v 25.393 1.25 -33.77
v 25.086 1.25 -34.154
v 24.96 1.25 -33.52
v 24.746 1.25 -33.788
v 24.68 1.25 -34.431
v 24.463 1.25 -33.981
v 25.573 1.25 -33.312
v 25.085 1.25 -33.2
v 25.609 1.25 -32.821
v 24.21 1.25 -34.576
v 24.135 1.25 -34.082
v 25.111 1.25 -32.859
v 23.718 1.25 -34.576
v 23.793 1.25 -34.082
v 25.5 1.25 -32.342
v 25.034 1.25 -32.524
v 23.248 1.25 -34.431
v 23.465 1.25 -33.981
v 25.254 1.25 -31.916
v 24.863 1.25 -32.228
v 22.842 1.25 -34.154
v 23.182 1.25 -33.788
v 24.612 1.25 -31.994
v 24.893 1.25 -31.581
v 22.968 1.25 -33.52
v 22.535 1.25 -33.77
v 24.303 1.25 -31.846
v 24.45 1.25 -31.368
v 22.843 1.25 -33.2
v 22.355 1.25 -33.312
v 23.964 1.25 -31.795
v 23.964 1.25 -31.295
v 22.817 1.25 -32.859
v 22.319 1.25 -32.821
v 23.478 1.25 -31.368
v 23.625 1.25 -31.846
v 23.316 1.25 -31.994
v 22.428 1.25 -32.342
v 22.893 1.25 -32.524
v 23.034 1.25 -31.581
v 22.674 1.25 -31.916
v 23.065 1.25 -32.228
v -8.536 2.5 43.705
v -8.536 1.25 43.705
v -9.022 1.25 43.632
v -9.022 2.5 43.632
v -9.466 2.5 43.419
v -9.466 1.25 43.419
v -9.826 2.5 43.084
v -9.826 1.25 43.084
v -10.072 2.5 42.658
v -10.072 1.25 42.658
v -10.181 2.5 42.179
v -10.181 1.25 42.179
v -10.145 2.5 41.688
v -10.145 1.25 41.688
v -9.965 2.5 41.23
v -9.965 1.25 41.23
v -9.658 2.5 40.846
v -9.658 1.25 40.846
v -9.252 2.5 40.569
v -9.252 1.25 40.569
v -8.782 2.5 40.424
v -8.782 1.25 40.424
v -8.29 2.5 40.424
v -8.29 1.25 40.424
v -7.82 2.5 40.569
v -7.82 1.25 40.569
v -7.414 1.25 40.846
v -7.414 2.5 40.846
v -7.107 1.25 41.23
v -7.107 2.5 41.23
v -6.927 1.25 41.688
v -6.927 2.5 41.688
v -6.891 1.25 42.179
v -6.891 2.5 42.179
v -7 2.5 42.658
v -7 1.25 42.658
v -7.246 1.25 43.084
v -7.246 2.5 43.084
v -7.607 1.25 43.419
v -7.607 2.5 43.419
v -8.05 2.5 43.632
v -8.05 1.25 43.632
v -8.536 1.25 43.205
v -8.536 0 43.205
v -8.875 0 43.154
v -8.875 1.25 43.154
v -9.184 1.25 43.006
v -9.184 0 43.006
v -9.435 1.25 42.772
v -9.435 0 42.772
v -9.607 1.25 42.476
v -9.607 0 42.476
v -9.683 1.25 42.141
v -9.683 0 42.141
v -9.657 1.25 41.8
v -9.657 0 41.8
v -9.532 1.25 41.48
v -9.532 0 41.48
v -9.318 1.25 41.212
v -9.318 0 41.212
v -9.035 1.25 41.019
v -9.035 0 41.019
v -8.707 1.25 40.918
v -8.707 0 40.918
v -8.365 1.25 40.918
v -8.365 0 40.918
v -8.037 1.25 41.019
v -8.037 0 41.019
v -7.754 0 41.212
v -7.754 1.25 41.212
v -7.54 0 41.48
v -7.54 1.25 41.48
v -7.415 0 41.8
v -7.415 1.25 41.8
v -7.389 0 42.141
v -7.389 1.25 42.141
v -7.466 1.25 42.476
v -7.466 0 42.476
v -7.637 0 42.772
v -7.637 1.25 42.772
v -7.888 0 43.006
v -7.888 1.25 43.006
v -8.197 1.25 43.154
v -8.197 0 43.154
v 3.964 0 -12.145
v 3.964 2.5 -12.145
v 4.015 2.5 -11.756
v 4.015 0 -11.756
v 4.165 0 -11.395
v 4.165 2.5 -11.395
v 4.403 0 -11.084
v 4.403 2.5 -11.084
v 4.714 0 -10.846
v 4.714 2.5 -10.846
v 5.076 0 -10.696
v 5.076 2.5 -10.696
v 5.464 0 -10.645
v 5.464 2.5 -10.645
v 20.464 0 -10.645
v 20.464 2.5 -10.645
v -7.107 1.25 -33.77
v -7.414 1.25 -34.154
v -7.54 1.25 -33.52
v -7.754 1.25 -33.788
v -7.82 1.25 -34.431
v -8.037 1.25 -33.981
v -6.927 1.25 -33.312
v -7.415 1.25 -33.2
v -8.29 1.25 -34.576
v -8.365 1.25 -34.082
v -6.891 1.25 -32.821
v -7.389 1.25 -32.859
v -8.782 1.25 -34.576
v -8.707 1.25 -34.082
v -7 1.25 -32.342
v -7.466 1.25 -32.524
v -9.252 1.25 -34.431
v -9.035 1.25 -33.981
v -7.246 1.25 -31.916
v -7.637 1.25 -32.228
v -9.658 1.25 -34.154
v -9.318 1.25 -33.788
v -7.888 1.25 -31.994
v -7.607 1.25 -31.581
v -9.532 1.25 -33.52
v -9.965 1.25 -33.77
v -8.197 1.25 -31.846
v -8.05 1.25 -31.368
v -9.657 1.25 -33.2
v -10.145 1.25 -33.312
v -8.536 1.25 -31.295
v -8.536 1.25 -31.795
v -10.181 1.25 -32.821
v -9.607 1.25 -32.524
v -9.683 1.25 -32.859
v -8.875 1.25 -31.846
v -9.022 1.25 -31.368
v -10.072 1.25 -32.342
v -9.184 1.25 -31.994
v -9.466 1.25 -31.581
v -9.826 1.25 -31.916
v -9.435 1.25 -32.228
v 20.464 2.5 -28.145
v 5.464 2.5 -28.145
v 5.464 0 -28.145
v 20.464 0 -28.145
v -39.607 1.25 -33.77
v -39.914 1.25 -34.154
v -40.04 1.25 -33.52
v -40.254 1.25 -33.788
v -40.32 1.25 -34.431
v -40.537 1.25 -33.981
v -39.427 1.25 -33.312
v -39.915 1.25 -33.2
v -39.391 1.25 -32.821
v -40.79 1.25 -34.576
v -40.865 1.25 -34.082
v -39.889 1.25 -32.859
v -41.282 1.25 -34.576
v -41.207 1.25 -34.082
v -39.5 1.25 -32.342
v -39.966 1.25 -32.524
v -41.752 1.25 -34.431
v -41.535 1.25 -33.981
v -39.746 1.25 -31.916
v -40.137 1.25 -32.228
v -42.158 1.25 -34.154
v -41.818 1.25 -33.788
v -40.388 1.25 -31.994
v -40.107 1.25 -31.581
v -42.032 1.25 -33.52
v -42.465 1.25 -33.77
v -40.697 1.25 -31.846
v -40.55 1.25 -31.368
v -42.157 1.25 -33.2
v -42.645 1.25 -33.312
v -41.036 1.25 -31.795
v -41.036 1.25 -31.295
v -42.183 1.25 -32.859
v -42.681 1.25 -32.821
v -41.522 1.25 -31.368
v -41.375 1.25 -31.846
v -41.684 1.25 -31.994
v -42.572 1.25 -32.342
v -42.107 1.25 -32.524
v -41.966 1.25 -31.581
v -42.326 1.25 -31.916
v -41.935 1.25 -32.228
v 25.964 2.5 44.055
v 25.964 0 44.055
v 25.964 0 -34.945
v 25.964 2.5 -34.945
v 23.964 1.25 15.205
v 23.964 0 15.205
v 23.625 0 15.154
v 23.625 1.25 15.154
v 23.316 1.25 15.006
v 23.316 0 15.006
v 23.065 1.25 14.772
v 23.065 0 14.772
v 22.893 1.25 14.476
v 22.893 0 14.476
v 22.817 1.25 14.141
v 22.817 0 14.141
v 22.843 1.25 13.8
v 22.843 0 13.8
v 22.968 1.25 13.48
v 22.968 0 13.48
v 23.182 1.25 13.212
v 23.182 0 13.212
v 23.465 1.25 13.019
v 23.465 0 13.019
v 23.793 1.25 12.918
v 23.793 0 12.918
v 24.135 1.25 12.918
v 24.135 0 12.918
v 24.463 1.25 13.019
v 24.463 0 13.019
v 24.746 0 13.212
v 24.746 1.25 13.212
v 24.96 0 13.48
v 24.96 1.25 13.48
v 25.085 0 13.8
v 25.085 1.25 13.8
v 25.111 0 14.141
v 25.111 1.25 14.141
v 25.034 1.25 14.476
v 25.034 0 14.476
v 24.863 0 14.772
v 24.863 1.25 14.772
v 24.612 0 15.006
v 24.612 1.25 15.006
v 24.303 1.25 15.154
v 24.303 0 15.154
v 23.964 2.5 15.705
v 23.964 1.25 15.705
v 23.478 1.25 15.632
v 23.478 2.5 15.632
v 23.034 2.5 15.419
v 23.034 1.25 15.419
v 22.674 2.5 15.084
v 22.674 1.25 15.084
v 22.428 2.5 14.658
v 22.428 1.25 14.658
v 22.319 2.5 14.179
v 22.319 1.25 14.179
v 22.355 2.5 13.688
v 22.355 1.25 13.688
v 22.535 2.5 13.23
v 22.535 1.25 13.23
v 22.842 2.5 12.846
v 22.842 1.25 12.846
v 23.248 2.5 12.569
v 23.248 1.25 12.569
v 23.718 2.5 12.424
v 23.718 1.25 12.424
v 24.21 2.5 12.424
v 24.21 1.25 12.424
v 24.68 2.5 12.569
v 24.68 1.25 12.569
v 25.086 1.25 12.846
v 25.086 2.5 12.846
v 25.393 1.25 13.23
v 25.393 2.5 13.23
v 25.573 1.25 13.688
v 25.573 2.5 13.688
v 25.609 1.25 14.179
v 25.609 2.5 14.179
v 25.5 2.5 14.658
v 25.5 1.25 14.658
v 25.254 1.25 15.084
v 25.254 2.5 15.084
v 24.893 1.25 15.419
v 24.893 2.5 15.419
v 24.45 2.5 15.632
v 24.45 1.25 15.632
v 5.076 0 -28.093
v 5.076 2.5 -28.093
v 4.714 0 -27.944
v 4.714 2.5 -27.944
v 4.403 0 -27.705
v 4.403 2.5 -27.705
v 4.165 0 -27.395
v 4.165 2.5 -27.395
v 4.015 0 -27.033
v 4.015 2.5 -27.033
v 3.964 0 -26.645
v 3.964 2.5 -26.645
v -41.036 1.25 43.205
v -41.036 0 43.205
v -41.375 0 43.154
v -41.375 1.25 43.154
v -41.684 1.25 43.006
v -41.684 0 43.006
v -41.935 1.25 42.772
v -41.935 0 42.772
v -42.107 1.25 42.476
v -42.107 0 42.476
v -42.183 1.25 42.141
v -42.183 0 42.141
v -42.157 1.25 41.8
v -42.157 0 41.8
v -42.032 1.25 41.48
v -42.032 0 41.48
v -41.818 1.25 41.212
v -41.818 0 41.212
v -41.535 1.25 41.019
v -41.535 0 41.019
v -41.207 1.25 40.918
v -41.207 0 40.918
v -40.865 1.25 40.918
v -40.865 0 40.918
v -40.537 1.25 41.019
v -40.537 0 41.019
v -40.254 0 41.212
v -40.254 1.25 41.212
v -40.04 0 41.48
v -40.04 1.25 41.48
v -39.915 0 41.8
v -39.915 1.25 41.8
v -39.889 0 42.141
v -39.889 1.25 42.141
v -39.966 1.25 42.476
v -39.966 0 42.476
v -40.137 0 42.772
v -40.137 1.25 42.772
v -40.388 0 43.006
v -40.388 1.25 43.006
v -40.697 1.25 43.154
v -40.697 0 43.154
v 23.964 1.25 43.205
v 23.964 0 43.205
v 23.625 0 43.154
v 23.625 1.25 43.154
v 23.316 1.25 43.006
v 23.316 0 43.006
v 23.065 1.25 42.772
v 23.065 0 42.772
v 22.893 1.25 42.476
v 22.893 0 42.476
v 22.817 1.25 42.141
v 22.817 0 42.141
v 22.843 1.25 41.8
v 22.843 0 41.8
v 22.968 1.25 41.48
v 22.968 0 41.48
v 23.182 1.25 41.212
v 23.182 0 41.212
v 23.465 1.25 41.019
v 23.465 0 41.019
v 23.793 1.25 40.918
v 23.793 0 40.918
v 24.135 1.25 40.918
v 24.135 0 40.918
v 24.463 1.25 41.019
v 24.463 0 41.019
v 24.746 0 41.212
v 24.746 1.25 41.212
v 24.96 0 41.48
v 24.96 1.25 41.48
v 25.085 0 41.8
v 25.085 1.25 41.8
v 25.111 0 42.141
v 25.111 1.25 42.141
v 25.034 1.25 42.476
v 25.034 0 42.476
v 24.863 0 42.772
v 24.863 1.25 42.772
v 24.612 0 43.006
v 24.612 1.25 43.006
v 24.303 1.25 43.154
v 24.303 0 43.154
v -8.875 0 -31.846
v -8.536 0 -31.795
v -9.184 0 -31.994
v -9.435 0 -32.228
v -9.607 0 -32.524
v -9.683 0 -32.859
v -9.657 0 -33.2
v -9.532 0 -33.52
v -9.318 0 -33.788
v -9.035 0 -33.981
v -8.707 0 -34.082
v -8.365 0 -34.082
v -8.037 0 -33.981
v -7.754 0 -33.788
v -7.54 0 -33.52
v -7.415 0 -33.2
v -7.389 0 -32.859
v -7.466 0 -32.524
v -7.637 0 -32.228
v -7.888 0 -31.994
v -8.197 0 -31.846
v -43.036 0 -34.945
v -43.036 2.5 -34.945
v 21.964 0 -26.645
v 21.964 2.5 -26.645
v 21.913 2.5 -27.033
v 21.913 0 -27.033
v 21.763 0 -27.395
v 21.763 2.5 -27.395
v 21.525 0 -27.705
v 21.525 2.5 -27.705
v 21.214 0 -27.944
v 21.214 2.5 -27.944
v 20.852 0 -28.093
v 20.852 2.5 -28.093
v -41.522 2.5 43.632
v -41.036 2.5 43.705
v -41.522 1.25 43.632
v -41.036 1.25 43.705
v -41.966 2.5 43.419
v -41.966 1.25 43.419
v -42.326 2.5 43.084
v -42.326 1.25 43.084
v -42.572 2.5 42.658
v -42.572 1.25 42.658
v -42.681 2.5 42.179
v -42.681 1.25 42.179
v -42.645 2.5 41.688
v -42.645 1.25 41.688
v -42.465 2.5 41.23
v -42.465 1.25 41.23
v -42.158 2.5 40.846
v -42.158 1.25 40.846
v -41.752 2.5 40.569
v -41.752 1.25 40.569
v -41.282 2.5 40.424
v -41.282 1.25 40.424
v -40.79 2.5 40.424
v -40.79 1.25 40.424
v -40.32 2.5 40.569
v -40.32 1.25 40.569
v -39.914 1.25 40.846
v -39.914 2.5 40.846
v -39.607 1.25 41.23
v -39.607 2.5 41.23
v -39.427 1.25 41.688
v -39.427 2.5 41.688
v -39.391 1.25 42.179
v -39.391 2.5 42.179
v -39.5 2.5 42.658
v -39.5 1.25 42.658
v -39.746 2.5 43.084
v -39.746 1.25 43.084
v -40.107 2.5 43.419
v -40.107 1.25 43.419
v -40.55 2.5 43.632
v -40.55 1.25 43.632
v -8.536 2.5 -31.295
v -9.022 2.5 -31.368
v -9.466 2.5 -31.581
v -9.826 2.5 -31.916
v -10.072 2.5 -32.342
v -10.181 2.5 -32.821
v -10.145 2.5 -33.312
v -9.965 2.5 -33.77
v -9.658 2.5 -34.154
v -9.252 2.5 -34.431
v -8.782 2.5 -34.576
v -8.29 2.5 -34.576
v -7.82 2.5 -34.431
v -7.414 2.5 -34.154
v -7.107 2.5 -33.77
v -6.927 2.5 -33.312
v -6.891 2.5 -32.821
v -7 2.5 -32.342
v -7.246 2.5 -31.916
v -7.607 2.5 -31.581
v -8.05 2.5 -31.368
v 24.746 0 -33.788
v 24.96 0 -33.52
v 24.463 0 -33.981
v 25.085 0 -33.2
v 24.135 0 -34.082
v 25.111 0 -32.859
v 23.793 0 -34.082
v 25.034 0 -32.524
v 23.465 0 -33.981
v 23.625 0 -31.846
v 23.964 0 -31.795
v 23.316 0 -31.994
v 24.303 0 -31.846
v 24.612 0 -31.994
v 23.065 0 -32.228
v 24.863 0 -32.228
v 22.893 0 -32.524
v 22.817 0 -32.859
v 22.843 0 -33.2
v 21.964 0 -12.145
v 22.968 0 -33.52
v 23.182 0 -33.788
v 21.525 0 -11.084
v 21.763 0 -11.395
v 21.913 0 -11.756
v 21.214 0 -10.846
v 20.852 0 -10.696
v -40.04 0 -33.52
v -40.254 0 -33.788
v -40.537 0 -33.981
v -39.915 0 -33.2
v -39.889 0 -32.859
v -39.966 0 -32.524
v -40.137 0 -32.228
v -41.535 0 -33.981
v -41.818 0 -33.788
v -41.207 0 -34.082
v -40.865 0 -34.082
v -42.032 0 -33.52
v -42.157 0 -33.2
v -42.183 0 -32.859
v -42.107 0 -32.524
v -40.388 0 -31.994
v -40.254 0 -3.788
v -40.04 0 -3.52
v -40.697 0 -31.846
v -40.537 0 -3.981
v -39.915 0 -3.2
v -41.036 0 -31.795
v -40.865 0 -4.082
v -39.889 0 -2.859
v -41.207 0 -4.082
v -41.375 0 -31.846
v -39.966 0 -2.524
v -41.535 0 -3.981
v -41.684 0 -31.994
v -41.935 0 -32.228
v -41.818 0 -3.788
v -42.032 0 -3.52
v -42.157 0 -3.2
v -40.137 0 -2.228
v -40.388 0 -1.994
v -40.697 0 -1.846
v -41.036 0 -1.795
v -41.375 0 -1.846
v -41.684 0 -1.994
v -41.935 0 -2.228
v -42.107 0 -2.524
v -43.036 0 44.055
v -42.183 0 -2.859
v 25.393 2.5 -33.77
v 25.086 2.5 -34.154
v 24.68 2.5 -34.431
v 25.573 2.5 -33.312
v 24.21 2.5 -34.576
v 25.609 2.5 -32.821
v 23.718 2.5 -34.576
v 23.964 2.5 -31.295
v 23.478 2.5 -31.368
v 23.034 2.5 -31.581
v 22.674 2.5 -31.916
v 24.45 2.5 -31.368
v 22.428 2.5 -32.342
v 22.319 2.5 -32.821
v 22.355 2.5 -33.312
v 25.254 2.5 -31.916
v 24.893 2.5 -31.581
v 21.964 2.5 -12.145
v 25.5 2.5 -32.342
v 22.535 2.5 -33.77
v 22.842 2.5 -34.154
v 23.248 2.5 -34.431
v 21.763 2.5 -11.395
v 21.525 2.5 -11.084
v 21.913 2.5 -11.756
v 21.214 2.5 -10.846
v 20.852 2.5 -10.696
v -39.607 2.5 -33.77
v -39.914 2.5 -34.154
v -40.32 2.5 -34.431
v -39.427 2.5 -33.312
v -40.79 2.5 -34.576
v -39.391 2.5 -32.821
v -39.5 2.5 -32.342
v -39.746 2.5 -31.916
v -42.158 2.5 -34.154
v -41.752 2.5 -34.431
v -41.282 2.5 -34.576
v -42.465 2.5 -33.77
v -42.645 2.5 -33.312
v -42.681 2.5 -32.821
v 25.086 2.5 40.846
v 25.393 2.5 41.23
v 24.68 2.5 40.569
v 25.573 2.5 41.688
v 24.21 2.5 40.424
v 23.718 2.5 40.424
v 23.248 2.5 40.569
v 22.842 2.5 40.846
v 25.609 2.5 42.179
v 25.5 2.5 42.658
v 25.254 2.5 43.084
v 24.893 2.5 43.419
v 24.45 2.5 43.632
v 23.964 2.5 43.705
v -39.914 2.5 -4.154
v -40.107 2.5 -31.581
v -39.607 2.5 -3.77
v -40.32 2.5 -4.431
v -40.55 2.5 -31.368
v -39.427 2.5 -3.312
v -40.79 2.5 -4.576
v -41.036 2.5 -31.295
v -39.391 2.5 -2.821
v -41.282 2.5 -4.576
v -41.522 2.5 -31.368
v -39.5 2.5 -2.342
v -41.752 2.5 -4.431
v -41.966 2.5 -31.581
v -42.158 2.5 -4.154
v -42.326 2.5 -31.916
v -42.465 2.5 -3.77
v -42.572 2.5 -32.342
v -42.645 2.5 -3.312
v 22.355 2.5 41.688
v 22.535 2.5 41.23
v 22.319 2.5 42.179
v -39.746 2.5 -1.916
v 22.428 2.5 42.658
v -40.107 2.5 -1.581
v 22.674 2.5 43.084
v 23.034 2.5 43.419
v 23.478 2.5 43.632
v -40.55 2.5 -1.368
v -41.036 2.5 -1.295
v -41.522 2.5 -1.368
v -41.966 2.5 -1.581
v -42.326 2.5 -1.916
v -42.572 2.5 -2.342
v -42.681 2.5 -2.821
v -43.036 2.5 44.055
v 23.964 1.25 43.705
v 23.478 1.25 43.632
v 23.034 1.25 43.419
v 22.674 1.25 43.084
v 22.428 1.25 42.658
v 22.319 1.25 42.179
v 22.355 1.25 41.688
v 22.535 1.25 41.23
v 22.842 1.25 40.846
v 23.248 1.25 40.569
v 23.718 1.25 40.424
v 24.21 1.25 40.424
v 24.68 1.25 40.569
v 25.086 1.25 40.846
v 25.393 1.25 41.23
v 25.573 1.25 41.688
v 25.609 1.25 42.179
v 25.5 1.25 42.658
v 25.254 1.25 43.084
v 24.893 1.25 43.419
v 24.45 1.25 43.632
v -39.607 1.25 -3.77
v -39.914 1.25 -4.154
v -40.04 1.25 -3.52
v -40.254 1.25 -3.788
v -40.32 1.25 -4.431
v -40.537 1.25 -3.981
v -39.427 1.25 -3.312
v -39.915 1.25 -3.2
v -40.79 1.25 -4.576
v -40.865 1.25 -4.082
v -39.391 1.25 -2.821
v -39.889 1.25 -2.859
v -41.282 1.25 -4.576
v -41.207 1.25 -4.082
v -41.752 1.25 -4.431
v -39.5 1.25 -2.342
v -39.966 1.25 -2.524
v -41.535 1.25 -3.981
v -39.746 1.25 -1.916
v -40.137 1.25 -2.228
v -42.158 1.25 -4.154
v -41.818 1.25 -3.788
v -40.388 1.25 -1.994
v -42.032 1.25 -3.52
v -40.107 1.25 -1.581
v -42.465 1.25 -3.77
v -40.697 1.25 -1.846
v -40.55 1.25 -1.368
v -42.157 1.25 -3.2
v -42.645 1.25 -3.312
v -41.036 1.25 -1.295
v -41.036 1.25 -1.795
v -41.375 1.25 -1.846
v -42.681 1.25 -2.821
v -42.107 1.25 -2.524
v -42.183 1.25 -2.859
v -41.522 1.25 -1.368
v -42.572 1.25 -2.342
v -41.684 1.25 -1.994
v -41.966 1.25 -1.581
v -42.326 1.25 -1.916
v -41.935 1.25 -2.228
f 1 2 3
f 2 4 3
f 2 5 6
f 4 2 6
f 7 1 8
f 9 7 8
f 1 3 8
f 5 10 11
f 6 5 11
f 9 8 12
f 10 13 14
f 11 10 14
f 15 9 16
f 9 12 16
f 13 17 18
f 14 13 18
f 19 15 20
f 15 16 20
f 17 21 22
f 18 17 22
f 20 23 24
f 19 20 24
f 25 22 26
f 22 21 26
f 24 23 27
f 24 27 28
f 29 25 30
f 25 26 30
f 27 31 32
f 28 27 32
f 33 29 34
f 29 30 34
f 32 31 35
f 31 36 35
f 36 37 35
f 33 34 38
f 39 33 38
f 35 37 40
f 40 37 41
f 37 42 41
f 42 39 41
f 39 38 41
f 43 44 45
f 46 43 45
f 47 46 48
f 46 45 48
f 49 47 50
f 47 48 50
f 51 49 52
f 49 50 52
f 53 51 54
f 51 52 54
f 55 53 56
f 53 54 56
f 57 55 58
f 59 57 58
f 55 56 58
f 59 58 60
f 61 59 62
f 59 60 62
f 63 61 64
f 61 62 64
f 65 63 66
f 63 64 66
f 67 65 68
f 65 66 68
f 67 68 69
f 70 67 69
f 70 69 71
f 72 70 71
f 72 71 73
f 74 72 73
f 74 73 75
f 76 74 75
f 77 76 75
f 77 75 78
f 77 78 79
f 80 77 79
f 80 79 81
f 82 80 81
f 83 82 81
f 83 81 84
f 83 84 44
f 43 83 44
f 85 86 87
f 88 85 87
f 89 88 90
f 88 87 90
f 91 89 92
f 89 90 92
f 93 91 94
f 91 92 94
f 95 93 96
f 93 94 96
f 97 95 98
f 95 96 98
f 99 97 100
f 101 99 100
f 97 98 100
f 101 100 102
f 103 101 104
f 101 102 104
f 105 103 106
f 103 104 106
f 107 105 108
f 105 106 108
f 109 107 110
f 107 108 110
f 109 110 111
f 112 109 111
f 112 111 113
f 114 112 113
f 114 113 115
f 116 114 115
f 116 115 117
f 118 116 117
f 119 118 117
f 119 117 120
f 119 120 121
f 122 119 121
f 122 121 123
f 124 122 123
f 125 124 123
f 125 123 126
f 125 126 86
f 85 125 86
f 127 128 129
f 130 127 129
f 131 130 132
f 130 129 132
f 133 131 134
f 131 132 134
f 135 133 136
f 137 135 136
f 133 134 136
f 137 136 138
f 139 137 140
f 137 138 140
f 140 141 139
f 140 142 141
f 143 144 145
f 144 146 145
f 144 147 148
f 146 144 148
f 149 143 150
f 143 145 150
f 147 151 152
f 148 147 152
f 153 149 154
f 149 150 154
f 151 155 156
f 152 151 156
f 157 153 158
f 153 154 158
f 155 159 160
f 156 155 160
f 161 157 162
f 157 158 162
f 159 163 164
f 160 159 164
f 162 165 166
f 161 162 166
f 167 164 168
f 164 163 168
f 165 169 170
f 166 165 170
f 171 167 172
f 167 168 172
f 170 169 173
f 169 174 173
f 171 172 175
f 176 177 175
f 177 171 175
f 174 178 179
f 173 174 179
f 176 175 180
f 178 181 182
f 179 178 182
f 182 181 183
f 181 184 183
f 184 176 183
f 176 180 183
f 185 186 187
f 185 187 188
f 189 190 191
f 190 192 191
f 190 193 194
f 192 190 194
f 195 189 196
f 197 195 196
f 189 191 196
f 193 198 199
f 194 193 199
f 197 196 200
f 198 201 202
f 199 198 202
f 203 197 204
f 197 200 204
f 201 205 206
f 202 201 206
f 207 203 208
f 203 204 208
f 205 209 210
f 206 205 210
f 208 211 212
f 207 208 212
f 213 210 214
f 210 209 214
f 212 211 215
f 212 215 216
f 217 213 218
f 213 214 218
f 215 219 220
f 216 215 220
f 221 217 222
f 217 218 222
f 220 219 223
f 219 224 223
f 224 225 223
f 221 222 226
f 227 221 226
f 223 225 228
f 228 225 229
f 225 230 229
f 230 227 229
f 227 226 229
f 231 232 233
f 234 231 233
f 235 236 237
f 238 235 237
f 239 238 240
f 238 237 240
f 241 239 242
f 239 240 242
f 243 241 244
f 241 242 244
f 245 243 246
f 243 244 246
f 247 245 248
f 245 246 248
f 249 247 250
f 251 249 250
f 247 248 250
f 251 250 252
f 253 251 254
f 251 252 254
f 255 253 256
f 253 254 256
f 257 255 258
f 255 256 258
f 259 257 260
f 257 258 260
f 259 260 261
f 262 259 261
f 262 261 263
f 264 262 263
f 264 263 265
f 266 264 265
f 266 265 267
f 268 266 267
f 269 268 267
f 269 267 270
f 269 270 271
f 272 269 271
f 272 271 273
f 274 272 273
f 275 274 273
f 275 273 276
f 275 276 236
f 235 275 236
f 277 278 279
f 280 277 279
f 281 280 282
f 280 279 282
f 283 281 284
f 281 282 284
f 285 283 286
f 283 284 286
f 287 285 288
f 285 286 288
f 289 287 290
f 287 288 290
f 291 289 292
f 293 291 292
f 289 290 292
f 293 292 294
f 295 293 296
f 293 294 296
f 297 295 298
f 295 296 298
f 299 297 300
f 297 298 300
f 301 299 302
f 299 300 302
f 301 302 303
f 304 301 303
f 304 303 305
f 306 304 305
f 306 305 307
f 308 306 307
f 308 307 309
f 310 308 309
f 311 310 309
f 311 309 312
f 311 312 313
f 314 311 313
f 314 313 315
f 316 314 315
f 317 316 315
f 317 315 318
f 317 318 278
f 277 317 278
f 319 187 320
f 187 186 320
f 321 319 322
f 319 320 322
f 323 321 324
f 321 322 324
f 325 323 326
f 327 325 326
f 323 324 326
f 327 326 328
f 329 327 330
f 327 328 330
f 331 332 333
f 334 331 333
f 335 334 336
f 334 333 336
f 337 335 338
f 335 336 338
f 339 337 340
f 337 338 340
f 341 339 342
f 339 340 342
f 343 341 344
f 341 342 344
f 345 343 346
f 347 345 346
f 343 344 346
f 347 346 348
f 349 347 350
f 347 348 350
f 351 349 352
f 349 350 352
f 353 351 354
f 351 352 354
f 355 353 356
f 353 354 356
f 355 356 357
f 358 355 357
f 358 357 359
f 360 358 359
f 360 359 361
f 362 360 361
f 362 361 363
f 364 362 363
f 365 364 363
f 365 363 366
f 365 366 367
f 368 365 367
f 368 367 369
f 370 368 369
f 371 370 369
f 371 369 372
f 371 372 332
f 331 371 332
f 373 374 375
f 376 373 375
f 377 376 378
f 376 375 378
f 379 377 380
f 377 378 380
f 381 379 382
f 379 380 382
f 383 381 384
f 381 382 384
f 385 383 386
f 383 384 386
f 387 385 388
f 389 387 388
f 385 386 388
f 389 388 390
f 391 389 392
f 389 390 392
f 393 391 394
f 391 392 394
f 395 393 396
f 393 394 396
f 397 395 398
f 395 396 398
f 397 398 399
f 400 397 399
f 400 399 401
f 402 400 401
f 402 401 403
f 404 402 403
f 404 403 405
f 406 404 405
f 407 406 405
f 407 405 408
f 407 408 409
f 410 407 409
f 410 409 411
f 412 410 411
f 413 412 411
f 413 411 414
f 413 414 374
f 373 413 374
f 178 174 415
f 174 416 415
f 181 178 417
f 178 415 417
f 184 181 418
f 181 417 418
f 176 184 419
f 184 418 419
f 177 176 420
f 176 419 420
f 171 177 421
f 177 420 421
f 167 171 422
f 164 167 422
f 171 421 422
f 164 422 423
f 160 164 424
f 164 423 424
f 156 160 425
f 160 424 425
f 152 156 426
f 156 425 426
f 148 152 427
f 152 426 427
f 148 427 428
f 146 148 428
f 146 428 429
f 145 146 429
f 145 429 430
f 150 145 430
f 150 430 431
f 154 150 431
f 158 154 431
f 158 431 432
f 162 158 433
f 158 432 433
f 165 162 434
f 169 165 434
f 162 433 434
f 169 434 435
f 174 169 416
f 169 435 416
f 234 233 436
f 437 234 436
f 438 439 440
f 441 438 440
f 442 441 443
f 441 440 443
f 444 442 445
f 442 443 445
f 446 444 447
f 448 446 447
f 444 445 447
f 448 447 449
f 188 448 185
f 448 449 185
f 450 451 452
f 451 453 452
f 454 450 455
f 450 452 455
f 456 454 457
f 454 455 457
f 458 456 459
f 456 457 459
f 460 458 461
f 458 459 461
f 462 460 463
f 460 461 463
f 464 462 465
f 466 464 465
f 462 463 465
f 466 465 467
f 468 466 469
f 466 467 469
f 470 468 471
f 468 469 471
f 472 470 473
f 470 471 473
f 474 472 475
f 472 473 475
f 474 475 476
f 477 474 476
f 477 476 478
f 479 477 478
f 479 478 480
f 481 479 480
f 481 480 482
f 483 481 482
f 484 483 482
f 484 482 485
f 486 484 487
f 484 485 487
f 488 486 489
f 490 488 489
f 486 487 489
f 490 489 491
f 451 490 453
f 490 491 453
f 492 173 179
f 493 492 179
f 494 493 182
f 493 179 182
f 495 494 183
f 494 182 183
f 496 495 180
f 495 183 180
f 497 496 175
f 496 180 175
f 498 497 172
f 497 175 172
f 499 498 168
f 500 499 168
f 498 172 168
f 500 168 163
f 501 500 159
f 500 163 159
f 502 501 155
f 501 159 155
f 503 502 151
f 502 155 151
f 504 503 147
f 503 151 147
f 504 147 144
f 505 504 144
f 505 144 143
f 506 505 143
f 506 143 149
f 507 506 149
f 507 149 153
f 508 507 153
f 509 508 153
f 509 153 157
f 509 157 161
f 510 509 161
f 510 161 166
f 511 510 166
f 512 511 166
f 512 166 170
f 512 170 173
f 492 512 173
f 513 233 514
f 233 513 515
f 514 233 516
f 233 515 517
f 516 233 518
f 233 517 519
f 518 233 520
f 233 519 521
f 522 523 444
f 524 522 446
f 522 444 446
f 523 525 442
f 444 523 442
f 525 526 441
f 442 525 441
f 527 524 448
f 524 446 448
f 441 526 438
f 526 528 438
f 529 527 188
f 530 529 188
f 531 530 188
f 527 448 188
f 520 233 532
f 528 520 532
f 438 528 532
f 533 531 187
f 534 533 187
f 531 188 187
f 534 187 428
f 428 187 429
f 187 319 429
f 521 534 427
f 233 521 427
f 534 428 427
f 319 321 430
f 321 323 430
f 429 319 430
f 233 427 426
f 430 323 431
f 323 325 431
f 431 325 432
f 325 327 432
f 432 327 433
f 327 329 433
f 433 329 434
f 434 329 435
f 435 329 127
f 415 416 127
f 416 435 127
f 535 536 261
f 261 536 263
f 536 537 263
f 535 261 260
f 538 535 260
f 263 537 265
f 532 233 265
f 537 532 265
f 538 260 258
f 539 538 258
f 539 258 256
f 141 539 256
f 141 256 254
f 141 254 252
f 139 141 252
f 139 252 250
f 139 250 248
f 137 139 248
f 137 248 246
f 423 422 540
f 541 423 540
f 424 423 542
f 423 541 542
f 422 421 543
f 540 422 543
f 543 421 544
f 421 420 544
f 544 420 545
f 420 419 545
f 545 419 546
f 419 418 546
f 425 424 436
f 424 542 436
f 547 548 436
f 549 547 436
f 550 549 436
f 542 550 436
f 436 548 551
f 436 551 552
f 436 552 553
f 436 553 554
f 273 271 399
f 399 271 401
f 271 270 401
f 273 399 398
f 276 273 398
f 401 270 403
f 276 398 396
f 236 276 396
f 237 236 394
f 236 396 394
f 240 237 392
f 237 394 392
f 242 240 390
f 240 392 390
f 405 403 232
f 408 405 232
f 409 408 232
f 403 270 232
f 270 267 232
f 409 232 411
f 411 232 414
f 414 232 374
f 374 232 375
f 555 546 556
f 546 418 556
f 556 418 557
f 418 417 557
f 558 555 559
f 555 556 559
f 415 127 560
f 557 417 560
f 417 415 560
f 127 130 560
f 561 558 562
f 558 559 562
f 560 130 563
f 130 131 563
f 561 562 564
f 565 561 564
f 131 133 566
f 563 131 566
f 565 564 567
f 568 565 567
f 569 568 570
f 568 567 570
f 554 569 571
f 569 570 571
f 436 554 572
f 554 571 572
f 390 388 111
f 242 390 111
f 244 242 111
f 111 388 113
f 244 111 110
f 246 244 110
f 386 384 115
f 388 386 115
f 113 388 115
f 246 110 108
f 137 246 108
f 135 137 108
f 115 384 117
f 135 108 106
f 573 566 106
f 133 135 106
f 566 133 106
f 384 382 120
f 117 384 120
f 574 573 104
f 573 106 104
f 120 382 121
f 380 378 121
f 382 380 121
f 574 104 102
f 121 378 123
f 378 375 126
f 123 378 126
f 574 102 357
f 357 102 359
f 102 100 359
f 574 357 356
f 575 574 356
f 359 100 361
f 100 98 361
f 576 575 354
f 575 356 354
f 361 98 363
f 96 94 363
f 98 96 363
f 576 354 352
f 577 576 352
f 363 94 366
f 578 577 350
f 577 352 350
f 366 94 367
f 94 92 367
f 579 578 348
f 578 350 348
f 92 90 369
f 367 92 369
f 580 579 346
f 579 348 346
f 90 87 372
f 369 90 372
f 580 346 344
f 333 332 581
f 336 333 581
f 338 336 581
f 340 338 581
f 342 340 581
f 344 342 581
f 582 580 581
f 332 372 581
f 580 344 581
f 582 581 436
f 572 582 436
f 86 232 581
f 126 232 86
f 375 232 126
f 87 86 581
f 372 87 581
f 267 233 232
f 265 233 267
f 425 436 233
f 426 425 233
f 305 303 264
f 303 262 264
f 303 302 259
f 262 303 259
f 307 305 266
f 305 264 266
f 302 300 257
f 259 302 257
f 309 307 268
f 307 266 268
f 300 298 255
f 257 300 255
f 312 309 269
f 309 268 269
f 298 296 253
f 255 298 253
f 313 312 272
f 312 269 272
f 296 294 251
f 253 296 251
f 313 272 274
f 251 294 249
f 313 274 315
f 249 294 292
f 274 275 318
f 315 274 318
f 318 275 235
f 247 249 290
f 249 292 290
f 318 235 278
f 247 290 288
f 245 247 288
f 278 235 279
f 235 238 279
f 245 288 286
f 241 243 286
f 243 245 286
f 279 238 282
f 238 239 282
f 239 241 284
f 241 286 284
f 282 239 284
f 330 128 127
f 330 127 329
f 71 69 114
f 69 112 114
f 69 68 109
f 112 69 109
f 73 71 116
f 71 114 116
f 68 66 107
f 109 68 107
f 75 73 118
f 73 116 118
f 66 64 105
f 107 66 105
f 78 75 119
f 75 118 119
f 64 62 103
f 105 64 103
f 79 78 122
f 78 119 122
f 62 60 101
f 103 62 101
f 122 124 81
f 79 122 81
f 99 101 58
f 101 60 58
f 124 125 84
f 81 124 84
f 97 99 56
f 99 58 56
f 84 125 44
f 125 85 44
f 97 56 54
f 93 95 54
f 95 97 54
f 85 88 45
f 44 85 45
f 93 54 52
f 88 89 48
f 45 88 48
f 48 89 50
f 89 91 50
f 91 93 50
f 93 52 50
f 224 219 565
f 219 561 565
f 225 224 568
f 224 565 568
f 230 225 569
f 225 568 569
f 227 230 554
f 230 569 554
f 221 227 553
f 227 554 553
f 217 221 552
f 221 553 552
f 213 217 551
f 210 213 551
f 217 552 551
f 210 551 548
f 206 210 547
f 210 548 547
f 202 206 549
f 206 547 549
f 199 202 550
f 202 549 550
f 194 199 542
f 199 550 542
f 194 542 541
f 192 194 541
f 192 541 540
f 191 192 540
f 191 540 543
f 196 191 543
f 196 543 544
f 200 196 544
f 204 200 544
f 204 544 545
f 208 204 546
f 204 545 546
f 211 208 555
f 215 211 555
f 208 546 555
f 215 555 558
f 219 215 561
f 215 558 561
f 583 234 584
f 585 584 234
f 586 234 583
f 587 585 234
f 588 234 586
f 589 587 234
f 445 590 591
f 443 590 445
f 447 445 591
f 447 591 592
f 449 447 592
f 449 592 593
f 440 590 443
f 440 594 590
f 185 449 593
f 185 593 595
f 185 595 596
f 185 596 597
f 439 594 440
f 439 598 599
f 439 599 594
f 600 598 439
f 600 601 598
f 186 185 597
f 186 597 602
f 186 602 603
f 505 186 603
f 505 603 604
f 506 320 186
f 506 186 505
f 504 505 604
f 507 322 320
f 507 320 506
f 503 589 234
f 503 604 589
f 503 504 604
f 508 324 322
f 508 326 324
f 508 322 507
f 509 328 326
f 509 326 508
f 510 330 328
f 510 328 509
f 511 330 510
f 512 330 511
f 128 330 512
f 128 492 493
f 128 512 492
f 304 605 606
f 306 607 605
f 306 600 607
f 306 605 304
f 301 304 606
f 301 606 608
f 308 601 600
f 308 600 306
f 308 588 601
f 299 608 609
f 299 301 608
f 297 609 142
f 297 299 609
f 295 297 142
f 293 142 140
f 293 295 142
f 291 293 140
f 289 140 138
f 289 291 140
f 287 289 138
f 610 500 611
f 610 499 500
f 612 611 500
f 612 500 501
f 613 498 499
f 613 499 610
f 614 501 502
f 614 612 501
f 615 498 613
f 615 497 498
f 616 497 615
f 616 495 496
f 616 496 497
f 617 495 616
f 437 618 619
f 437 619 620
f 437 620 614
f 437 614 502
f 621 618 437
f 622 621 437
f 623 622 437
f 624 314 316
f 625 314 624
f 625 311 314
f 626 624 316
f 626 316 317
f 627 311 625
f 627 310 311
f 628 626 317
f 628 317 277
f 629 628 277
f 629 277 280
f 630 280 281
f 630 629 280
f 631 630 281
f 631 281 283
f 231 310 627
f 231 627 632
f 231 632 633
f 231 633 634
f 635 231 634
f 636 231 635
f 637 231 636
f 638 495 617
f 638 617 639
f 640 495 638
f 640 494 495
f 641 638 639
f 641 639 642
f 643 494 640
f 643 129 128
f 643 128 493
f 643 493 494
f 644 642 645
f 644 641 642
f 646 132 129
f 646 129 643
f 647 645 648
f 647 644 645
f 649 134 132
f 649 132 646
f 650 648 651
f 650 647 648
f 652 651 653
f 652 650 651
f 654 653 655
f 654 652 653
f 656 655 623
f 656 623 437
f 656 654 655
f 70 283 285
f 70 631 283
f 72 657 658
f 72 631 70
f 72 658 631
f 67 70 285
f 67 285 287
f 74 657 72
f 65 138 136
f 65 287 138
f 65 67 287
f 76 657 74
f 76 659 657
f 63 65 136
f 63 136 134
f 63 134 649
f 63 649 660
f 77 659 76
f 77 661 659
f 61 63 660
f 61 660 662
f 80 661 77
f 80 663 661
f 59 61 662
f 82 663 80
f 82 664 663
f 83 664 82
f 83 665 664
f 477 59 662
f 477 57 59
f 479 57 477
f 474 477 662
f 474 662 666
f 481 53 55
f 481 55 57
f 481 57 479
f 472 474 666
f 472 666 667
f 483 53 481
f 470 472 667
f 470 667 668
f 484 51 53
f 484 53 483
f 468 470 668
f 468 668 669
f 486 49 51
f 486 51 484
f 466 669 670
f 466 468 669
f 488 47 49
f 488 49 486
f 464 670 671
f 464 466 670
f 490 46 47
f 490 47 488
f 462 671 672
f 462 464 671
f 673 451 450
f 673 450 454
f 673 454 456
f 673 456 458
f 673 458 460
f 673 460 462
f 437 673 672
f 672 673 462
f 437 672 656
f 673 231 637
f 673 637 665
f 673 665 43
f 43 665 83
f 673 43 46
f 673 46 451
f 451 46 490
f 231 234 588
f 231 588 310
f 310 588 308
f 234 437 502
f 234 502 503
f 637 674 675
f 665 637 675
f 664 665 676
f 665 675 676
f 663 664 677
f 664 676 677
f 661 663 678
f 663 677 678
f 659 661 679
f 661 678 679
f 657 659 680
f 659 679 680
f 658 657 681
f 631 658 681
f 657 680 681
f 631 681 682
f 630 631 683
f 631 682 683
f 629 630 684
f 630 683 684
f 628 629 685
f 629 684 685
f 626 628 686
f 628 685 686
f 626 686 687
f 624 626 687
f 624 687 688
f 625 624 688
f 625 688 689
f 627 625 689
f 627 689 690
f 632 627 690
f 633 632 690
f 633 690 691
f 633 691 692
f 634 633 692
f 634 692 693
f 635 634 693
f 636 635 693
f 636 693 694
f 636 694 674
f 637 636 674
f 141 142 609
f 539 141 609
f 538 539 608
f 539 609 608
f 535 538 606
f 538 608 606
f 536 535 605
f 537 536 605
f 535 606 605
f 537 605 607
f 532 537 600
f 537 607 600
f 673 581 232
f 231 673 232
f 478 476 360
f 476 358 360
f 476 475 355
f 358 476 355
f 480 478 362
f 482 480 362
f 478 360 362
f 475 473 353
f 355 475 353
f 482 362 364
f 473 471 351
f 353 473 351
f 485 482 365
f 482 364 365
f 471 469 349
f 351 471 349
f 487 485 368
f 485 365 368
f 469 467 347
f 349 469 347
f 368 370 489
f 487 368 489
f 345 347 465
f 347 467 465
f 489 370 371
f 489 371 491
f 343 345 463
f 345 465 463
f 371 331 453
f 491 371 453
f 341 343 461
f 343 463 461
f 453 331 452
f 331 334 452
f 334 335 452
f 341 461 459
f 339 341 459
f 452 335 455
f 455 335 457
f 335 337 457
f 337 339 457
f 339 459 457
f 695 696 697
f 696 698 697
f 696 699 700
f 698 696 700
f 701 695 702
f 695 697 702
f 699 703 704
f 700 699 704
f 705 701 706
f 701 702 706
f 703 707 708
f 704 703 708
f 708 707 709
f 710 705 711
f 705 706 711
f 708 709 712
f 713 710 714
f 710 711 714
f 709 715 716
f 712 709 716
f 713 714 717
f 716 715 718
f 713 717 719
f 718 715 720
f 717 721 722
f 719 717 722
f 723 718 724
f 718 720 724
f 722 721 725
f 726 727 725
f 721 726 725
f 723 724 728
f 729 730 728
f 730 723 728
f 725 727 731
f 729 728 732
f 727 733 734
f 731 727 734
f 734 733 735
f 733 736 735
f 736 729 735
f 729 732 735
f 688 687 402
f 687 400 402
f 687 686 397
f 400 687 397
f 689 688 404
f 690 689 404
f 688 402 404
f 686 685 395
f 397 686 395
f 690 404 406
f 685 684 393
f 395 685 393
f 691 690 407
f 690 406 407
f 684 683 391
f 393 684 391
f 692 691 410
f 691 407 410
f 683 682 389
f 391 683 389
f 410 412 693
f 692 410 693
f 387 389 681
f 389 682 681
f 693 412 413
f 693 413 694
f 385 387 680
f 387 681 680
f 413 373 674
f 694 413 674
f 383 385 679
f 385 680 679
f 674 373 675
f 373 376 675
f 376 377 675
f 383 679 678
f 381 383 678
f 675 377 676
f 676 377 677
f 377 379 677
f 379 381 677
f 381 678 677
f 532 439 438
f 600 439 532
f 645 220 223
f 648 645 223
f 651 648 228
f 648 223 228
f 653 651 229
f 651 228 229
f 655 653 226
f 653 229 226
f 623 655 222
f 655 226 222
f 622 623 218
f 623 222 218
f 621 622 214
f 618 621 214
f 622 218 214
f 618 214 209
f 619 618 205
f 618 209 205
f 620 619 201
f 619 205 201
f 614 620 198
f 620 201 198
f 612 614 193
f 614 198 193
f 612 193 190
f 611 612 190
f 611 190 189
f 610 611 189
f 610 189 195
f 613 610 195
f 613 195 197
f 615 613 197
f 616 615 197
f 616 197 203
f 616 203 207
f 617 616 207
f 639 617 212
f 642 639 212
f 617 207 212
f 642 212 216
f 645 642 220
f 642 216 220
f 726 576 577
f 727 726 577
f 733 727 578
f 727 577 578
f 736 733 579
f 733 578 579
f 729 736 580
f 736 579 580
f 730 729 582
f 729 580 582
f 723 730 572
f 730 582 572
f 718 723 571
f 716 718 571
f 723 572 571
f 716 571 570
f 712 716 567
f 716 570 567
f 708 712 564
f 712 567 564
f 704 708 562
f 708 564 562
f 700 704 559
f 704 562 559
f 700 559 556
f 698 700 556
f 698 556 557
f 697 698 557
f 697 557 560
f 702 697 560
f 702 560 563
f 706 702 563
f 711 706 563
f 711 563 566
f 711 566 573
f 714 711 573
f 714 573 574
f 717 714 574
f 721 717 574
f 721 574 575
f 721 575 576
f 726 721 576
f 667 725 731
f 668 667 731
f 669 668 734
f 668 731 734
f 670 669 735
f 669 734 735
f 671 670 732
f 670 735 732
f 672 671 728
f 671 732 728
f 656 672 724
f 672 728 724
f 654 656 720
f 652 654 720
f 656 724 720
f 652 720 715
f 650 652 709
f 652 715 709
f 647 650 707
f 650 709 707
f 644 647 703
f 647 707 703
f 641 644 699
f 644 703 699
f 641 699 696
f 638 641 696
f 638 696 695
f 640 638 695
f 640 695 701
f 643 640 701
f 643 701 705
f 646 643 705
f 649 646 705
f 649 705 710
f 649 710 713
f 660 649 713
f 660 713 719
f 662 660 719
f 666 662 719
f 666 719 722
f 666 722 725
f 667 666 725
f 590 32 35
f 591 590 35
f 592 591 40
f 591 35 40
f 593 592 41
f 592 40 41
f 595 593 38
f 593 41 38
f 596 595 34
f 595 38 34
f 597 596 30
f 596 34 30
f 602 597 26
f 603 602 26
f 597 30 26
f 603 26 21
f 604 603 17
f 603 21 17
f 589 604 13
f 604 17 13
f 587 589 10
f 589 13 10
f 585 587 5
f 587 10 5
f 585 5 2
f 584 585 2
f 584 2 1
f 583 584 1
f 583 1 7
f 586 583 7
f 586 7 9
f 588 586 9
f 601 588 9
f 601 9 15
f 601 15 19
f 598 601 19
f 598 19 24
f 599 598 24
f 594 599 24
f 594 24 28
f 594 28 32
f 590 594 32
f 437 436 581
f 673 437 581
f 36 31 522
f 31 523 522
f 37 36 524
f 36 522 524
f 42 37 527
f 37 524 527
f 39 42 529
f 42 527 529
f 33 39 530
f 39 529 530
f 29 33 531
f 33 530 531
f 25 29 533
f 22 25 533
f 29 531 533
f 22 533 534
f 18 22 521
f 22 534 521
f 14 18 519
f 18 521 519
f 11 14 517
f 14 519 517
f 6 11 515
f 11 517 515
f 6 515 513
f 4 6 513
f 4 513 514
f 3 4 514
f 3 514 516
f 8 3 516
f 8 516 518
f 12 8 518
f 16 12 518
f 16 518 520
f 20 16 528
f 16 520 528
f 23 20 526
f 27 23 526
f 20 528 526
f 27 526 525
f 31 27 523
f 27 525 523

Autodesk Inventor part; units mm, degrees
ref_plane "YZ Plane" through (0, 0, 0) normal (1, 0, 0) x (0, 1, 0)
ref_plane "XZ Plane" through (0, 0, 0) normal (0, 1, 0) x (-1, 0, 0)
ref_plane "XY Plane" through (0, 0, 0) normal (0, 0, 1) x (1, 0, 0)
sketch "Sketch1" plane through (0, 0, 0) normal (0, 1, 0) x (-1, 0, 0)
  line L0 (43.0361, 44.0554) -> (-25.9639, 44.0554)
  line L1 (-25.9639, 44.0554) -> (-25.9639, -34.9446)
  line L2 (-25.9639, -34.9446) -> (43.0361, -34.9446)
  line L3 (43.0361, -34.9446) -> (43.0361, 44.0554)
  point P0 (0, 0)
  dimension "d0" = 69
  dimension "d1" = 79
extrude "Extrusion1" add sketch "Sketch1" along normal blind 2.5
sketch "Sketch2" plane through (0, 2.5, 0) normal (0, 1, 0) x (1, 0, 0)
  circle A0 centre (23.9639, -42.0554) radius 1.2843
  line L0 (25.9639, -44.0554) -> (25.9639, 34.9446) projected
  line L1 (-43.0361, -44.0554) -> (25.9639, -44.0554) projected
  circle A1 centre (-41.0361, 2.9446) radius 1.3818
  circle A2 centre (23.9639, -14.0554) radius 1.5724
  line L2 (-43.0361, 34.9446) -> (-43.0361, -44.0554) projected
  line L3 (25.9639, 34.9446) -> (-43.0361, 34.9446) projected
  circle A3 centre (-8.5361, 32.9446) radius 1.5869
  circle A4 centre (-8.5361, -42.0554) radius 2.0414
  point P0 (0, 0)
  dimension "d4" = 2
  dimension "d5" = 2
  dimension "d26" = 2
  dimension "d27" = 2
  dimension "d28" = 32
  dimension "d29" = 30
  dimension "d37" = 2
  dimension "d38" = 2
  dimension "d39" = 34.5
  dimension "d40" = 34.5
hole "Hole1" at (23.9639, 2.5, 42.0554) direction (0, -1, 0) diameter 2.3 end through all counterbore diameter 3.3 counterbore depth 1.25
pattern_linear "Rectangular Pattern1" count 2 spacing 65 along (-1, 0, 0) count 2 spacing 75 along (0, 0, -1) of "Hole1"
sketch "Sketch3" plane through (0, 2.5, 0) normal (0, 1, 0) x (1, 0, 0)
  line L0 (5.4639, 28.1446) -> (20.4639, 28.1446)
  line L1 (21.9639, 26.6446) -> (21.9639, 12.1446)
  line L2 (20.4639, 10.6446) -> (5.4639, 10.6446)
  line L3 (3.9639, 12.1446) -> (3.9639, 26.6446)
  line L4 (-43.0361, -44.0554) -> (25.9639, -44.0554) projected
  line L5 (25.9639, -44.0554) -> (25.9639, 34.9446) projected
  arc A0 (5.4639, 28.1446) -> (3.9639, 26.6446) centre (5.4639, 26.6446) ccw
  arc A1 (21.9639, 26.6446) -> (20.4639, 28.1446) centre (20.4639, 26.6446) ccw
  arc A2 (20.4639, 10.6446) -> (21.9639, 12.1446) centre (20.4639, 12.1446) ccw
  arc A3 (3.9639, 12.1446) -> (5.4639, 10.6446) centre (5.4639, 12.1446) ccw
  point P0 (0, 0)
  point P1 (3.9639, 28.1446)
  point P2 (21.9639, 10.6446)
  point P3 (21.9639, 28.1446)
  point P4 (3.9639, 10.6446)
  dimension "d19" = 54.7
  dimension "d20" = 4
  dimension "d21" = 18
  dimension "d22" = 17.5
  dimension "d25" = 1.5
extrude "Extrusion2" cut sketch "Sketch3" against normal blind 2.5
hole "Hole2" at (-41.0361, 2.5, -2.9446) at (23.9639, 2.5, 14.0554) direction (0, -1, 0) diameter 2.3 end through all counterbore diameter 3.3 counterbore depth 1.25
hole "Hole3" at (-8.5361, 2.5, -32.9446) at (-8.5361, 2.5, 42.0554) direction (0, -1, 0) diameter 2.3 end through all counterbore diameter 3.3 counterbore depth 1.25
properties part number "Lid"
